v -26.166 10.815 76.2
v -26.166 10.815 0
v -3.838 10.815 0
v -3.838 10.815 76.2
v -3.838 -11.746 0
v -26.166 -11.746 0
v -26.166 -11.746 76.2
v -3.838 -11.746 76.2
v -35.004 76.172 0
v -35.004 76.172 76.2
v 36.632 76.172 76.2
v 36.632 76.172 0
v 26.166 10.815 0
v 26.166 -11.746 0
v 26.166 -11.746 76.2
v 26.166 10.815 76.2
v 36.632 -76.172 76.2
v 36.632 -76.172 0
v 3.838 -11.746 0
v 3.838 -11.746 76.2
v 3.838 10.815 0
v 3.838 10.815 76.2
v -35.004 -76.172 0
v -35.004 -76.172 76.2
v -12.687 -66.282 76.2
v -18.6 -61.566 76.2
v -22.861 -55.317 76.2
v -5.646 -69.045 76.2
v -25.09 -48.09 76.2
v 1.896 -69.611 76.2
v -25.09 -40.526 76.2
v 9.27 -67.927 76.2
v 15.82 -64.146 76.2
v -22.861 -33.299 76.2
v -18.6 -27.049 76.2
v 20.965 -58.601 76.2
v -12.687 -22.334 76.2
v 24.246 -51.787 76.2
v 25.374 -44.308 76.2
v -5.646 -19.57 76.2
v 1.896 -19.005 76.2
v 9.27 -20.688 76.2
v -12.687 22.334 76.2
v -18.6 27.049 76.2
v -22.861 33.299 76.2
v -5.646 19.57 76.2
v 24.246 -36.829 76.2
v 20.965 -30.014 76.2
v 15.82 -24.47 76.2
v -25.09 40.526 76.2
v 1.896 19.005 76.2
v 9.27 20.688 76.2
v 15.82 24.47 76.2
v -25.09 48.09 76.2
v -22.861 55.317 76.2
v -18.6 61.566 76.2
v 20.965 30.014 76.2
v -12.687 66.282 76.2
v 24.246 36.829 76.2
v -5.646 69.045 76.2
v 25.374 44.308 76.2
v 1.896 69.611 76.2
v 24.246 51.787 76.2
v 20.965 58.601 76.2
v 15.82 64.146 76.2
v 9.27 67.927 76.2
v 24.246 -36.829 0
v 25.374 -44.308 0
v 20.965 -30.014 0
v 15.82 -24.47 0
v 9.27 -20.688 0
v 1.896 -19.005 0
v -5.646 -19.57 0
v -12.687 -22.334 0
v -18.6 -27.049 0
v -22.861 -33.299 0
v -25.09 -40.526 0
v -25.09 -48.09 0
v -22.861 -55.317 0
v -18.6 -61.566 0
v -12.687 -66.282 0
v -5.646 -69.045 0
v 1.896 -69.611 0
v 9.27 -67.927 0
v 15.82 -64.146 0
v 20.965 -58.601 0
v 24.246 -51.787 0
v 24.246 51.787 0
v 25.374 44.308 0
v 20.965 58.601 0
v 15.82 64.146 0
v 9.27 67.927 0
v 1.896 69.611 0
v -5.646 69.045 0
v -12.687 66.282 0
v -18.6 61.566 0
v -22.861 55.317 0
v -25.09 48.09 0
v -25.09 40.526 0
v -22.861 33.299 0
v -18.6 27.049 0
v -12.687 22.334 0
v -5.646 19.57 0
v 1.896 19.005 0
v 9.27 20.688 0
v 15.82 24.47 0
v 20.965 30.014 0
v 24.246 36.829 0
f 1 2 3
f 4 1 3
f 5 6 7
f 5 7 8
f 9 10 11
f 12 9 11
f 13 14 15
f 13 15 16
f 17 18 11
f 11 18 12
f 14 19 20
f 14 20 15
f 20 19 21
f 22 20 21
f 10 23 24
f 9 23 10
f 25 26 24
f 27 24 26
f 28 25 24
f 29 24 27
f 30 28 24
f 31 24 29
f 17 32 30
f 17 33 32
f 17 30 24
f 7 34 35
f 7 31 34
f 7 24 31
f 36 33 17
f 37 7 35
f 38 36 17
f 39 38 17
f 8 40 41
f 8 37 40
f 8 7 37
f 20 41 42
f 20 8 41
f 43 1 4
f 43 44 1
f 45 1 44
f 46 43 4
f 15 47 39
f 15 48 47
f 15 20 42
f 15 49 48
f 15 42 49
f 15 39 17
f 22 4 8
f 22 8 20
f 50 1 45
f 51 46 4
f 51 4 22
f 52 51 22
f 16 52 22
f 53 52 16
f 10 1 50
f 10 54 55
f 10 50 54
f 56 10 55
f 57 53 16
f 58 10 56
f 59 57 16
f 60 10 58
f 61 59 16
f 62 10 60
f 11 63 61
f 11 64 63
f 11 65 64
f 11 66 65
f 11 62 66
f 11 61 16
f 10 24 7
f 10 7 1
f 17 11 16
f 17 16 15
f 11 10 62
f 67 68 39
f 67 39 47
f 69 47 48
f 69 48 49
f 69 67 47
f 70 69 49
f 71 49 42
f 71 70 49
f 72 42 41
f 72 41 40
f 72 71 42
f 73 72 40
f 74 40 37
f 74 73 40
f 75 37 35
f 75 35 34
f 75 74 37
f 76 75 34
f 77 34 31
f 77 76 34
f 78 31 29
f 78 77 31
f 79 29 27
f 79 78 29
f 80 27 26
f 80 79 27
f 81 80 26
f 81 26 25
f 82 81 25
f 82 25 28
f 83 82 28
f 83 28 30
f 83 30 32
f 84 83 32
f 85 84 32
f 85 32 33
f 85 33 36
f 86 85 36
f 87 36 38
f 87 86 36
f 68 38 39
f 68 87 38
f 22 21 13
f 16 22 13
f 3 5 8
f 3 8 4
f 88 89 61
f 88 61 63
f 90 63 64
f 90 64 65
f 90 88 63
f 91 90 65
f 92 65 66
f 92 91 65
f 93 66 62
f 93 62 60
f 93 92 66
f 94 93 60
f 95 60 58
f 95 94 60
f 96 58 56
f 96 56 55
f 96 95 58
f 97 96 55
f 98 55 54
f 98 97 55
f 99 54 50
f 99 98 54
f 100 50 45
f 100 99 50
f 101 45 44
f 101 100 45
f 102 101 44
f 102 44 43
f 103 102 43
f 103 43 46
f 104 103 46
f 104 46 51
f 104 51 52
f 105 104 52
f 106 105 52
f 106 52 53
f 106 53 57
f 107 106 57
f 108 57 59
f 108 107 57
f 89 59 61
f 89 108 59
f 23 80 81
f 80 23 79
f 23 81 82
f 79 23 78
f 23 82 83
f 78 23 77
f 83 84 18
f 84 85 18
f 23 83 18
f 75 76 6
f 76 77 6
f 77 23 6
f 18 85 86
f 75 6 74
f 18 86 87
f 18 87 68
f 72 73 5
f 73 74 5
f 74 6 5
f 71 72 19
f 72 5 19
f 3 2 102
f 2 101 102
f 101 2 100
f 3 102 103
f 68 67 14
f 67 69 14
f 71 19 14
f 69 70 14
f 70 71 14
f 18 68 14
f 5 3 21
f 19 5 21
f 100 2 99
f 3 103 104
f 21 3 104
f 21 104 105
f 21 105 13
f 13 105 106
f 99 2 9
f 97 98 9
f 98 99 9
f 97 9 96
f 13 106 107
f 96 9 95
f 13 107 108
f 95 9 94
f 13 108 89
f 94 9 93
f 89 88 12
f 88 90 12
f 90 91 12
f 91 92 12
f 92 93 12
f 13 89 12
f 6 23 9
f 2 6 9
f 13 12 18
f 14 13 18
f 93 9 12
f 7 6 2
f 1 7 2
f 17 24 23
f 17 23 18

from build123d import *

# Parameters (mm, degrees)
F0_W     = 71.63686
F0_H     = 152.34463
F0_R     = 25.373603
F0_W_2   = 22.328374
F0_H_2   = 22.560959
F1_DEPTH = 76.2


with BuildPart() as f1:
    # F0 (on Top) → F1 (new body)
    with BuildSketch(Plane.XY):
        with Locations((0.814056, 0)):
            Rectangle(F0_W, F0_H)
        with Locations((0, -44.307865)):
            Circle(F0_R, mode=Mode.SUBTRACT)
        with Locations((-15.001876, -0.465175)):
            Rectangle(F0_W_2, F0_H_2, mode=Mode.SUBTRACT)
        with Locations((15.001876, -0.465175)):
            Rectangle(F0_W_2, F0_H_2, mode=Mode.SUBTRACT)
        with Locations((0, 44.307865)):
            Circle(F0_R, mode=Mode.SUBTRACT)
    extrude(amount=F1_DEPTH)


solid = f1.part
